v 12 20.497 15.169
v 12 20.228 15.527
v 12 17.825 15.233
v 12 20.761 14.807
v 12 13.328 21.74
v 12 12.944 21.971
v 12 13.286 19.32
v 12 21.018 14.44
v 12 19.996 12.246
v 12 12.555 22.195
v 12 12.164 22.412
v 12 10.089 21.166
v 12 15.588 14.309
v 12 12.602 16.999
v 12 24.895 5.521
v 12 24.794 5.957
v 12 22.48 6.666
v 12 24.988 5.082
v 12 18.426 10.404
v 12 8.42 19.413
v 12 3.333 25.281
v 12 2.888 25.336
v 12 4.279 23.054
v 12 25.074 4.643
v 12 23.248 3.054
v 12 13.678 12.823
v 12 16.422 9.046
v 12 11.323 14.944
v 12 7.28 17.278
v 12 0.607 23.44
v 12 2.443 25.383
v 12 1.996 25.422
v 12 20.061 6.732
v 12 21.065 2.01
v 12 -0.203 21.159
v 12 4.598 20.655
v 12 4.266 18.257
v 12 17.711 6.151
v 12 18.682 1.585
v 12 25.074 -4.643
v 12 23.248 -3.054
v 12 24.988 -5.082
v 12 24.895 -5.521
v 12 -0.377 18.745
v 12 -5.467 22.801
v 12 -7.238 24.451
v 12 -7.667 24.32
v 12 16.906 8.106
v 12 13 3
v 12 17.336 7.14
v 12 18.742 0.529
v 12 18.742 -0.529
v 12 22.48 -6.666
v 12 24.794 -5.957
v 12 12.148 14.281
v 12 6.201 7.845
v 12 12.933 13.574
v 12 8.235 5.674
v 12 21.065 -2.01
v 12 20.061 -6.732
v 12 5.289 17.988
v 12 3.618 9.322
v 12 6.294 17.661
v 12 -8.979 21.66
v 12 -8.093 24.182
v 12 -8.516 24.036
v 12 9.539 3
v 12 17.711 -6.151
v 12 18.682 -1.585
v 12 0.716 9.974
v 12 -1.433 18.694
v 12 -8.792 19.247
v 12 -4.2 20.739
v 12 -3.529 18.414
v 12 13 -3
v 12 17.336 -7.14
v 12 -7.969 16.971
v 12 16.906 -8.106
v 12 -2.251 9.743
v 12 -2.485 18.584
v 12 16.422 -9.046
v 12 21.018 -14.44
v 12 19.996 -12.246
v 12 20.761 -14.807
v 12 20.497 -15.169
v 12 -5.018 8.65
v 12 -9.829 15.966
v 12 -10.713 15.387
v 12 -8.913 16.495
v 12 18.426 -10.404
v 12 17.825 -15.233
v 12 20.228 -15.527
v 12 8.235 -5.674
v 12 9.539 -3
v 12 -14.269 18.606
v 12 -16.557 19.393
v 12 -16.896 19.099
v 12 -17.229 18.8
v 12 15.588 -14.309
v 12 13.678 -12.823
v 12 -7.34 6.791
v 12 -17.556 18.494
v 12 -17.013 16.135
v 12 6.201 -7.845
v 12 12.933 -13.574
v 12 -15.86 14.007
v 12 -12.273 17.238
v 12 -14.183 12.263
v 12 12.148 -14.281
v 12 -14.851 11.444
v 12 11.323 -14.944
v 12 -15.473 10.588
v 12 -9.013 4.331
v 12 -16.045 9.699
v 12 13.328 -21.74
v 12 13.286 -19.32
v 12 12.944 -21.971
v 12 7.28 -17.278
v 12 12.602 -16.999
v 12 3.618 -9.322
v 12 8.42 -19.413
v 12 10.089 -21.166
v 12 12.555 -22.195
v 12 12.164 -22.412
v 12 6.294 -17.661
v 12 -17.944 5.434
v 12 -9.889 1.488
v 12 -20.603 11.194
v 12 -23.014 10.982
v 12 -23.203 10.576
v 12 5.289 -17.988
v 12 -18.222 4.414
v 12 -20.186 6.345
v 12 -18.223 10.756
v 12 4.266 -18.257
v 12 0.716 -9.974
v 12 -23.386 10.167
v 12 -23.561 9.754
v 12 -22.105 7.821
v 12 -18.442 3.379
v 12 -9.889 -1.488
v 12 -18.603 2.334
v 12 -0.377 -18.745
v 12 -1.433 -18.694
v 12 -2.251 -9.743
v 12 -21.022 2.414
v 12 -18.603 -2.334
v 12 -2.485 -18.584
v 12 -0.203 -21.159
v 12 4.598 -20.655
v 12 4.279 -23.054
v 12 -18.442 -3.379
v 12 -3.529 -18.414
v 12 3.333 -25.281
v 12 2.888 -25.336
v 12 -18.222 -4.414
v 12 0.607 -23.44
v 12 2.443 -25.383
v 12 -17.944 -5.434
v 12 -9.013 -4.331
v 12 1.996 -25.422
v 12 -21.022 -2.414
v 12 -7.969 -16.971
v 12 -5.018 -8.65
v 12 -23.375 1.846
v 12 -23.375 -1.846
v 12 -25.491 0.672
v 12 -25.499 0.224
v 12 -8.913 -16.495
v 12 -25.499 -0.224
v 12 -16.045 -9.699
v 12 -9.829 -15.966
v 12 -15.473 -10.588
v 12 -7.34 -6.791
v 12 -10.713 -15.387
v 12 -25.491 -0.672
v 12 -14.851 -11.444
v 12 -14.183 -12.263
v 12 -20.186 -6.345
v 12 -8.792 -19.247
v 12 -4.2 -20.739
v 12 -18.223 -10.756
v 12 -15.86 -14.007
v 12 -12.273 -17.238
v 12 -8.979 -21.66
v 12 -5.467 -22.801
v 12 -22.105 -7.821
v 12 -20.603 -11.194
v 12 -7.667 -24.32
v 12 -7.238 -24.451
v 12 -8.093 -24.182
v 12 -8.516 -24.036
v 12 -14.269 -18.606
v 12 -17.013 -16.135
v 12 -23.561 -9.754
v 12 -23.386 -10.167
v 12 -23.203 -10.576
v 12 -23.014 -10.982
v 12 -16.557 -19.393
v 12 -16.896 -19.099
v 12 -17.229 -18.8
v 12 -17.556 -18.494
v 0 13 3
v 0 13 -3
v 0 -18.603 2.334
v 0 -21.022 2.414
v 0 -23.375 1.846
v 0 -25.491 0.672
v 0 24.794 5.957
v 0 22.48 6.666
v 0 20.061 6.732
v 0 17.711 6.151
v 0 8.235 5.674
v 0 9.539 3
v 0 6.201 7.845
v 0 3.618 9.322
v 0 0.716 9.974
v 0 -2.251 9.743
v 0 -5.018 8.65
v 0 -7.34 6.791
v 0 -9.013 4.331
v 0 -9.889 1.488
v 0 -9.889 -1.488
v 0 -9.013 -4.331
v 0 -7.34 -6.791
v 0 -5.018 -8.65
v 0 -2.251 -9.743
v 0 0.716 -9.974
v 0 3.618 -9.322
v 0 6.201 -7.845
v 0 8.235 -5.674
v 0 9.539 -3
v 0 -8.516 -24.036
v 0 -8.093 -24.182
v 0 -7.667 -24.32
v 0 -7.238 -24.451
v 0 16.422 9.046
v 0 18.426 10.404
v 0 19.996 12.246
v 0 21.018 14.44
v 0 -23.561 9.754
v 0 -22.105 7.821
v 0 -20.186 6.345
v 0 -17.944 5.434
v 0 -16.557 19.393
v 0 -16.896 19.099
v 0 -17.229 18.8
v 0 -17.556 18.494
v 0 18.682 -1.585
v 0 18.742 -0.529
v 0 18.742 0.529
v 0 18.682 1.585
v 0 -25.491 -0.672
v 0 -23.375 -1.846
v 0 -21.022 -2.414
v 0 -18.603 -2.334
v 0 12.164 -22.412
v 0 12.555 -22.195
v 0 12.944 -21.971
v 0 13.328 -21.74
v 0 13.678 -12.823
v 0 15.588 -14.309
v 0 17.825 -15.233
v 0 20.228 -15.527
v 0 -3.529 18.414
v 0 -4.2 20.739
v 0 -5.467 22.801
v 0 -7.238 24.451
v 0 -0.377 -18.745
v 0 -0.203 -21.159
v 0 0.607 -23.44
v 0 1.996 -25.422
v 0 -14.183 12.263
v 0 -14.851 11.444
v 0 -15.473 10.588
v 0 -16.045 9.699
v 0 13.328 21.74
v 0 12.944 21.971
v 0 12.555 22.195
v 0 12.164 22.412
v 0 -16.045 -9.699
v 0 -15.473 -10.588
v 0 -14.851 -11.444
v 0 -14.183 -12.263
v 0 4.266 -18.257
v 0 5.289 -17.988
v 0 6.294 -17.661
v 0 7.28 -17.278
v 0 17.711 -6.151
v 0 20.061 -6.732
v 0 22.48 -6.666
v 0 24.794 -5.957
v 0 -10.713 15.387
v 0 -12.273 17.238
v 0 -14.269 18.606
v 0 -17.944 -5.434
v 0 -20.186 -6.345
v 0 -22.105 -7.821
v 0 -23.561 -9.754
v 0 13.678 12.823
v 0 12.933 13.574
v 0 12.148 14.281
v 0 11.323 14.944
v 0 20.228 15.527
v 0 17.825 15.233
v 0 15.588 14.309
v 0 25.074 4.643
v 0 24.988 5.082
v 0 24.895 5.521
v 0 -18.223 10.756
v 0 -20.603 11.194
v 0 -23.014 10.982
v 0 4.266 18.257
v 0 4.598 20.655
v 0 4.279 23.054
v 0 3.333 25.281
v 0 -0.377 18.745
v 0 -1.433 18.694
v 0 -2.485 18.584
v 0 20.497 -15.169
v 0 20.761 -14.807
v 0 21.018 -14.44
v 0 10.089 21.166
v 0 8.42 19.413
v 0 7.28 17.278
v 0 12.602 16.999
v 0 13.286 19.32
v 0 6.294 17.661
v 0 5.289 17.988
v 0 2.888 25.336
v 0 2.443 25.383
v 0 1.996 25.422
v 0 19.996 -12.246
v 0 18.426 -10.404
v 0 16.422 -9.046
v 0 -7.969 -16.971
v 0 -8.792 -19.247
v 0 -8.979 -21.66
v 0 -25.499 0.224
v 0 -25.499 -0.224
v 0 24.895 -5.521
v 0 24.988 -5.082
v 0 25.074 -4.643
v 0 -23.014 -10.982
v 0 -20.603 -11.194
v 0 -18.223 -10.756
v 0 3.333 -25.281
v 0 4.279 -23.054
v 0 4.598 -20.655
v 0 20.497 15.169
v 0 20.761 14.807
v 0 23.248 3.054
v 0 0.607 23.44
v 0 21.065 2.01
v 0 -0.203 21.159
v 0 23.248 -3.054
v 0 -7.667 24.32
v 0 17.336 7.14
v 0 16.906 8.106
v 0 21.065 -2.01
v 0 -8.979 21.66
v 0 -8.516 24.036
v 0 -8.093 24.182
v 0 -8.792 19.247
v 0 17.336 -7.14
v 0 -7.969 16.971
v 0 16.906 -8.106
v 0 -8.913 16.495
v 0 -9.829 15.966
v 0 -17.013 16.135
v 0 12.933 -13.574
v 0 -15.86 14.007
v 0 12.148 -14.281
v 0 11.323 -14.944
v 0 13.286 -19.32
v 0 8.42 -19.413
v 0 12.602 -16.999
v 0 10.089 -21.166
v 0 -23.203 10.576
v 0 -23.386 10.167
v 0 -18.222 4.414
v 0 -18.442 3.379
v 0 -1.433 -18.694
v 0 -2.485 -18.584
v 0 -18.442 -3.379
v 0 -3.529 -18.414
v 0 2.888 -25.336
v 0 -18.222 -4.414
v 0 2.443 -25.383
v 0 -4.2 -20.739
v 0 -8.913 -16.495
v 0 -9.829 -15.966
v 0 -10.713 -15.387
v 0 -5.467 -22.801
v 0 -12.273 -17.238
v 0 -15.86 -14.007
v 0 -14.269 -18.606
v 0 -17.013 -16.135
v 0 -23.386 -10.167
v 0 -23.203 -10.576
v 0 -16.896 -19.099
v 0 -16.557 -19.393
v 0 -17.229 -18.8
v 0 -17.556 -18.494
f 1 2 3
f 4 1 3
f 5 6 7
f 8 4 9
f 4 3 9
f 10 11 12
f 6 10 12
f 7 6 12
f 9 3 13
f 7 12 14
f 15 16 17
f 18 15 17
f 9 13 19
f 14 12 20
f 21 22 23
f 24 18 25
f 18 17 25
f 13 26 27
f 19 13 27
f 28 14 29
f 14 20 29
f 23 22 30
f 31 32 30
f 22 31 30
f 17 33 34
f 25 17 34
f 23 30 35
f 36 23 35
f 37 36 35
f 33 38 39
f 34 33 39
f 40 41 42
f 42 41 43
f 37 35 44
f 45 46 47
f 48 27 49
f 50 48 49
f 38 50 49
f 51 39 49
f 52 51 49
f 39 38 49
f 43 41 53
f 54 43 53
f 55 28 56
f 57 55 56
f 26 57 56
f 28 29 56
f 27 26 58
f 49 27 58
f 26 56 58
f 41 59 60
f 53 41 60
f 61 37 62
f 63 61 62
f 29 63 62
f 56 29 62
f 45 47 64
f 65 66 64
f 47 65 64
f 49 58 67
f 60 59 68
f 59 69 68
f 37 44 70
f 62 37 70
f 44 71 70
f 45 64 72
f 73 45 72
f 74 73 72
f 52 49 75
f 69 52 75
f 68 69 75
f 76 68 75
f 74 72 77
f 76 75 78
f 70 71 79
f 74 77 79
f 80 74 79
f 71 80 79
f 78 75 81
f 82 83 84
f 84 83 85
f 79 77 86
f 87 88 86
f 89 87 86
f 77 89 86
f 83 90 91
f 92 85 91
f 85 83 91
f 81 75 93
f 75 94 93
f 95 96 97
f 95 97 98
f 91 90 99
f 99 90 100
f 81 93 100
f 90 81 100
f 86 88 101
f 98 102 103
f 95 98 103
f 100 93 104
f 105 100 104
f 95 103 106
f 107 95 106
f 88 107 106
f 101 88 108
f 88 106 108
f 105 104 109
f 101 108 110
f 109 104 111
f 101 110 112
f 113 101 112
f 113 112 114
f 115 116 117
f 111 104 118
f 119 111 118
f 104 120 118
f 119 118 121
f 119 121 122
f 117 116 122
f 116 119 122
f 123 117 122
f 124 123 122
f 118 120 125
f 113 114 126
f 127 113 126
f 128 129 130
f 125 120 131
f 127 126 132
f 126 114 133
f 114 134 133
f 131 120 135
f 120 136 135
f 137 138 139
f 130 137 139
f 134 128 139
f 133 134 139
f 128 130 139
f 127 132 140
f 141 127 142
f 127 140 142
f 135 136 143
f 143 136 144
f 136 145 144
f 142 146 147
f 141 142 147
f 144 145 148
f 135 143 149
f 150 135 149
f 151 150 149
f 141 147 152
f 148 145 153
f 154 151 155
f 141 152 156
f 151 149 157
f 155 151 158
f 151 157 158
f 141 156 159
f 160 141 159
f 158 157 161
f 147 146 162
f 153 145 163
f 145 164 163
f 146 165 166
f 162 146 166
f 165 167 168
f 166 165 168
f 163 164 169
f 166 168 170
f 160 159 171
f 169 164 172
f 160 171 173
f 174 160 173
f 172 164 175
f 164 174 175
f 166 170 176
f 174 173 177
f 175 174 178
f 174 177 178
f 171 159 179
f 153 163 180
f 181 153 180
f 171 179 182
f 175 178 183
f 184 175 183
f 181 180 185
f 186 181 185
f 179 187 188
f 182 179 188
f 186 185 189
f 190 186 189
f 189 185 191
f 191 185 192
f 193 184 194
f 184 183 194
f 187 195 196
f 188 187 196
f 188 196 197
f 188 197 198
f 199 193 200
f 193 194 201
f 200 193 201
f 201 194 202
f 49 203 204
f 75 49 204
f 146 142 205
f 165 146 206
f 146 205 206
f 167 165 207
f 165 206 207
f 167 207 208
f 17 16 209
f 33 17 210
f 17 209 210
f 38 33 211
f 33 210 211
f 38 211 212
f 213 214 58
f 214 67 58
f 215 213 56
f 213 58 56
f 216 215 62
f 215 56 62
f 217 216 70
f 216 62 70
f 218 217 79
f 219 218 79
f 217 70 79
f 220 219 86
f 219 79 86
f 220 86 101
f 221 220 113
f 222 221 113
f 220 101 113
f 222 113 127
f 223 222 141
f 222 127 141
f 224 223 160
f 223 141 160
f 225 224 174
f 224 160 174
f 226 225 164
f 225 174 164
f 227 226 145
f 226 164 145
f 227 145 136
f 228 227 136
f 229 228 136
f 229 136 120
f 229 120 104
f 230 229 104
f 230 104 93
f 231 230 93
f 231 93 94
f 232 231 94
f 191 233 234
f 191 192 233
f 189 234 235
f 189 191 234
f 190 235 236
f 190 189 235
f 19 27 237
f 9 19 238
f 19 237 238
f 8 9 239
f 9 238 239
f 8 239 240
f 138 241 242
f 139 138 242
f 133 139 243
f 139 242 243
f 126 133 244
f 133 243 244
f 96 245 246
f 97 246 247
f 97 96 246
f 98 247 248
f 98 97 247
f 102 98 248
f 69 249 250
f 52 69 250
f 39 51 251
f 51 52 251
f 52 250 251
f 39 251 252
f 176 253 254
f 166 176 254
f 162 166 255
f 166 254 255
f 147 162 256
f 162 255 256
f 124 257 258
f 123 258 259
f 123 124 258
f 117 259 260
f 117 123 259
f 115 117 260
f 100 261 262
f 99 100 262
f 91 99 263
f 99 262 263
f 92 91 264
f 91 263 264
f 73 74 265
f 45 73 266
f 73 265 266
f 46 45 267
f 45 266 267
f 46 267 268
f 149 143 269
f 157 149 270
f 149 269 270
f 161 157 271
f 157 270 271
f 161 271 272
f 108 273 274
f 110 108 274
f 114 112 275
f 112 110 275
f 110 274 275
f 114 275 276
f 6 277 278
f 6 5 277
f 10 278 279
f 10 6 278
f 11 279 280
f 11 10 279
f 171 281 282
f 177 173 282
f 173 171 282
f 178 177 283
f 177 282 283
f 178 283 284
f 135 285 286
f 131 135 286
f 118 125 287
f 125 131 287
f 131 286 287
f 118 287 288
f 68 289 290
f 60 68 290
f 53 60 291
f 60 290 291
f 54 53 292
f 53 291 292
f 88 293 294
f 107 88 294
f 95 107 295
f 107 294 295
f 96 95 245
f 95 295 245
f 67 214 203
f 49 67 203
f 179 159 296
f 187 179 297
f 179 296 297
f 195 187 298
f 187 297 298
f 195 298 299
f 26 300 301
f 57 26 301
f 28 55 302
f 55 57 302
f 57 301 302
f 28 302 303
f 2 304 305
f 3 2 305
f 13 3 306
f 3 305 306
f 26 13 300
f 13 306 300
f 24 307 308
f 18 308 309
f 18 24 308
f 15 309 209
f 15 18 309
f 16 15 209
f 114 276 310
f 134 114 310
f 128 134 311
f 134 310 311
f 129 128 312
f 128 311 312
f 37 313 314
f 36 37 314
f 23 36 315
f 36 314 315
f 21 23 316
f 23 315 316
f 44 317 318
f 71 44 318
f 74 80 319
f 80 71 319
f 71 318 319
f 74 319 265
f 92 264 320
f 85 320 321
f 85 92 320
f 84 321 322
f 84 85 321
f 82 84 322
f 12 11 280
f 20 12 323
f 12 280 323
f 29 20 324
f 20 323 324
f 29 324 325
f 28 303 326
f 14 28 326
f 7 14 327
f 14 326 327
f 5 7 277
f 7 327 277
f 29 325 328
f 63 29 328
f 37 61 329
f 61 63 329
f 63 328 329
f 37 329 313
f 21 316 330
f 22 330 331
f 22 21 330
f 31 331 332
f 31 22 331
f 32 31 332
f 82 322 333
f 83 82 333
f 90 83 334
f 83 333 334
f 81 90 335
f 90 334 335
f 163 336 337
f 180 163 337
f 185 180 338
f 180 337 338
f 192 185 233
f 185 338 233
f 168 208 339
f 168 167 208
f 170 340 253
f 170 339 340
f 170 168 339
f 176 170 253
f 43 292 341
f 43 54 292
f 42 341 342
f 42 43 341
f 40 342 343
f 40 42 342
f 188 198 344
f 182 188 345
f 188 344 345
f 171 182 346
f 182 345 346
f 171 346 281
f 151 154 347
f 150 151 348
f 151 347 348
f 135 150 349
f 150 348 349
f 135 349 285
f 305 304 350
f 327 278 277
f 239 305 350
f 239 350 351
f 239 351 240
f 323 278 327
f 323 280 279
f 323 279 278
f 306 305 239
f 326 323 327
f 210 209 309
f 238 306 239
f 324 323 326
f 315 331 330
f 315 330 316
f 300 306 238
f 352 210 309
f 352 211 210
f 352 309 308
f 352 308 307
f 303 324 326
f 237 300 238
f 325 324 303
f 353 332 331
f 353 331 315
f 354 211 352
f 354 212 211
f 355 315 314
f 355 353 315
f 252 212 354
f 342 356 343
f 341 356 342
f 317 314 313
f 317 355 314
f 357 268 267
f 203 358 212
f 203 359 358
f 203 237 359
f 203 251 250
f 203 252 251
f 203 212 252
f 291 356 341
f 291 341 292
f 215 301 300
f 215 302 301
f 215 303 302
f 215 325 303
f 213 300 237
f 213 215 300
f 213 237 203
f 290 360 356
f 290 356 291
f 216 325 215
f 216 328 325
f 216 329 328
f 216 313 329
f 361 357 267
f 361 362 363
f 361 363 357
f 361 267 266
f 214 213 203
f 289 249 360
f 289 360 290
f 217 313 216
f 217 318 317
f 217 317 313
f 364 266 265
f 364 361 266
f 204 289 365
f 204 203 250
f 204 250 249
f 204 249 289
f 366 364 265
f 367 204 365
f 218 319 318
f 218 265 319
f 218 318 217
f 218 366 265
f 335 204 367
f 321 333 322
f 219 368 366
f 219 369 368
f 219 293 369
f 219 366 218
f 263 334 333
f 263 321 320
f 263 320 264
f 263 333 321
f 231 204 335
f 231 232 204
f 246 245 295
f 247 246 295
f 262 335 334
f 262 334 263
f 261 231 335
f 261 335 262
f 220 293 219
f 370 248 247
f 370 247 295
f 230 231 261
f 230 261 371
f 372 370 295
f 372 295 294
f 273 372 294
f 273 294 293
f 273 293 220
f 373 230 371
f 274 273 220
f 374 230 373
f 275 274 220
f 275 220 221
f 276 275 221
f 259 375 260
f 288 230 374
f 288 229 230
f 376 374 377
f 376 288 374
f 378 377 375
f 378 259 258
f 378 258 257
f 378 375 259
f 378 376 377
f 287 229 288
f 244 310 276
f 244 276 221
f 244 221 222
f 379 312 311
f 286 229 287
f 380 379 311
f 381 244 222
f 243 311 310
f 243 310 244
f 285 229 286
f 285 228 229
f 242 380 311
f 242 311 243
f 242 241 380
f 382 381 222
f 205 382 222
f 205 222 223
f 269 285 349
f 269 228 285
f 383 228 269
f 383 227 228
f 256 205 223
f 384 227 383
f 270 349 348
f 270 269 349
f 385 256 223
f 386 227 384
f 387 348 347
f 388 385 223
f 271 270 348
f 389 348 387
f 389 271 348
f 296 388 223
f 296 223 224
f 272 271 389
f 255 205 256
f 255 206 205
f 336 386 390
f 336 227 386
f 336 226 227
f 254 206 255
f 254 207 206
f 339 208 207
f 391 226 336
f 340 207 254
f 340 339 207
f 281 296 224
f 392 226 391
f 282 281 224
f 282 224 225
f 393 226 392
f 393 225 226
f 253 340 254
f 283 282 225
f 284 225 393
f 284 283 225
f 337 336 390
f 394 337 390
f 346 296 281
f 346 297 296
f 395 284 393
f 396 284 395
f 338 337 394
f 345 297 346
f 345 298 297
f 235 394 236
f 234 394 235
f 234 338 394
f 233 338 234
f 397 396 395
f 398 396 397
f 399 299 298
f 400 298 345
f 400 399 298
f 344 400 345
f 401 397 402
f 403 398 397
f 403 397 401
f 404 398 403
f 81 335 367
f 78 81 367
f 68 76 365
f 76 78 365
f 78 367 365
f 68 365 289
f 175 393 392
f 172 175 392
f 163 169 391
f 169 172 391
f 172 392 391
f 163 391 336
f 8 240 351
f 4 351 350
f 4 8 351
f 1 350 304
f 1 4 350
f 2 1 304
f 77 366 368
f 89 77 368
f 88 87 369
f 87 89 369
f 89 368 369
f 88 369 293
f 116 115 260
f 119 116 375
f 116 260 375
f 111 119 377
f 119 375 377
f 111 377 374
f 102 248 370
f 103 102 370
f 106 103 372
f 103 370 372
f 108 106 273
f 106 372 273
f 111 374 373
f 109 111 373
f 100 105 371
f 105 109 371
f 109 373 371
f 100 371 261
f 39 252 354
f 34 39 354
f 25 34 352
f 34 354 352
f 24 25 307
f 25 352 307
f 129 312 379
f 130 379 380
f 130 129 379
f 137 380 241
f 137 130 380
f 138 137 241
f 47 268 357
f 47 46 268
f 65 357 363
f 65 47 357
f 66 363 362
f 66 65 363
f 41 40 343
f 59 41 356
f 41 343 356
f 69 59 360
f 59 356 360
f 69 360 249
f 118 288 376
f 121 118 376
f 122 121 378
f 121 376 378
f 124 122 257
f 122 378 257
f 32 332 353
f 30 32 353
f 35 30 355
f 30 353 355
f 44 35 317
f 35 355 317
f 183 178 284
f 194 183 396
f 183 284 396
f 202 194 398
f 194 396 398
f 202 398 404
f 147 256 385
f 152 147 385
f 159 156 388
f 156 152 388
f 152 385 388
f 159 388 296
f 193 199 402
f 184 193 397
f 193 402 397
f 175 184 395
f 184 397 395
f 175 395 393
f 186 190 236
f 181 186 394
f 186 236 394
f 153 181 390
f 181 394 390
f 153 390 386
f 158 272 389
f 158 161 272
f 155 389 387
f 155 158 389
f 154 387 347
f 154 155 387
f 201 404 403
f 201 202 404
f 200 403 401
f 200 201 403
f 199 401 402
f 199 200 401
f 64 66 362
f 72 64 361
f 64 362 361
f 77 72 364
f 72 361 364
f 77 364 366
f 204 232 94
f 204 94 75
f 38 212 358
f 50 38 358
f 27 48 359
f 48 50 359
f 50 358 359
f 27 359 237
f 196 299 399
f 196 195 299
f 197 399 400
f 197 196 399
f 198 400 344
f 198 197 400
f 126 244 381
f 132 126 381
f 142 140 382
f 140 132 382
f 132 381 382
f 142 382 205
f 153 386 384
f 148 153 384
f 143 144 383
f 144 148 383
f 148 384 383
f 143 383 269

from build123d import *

# Parameters (mm, degrees)
BASPROSKE_W             = 12
BASPROSKE_H             = 25.5
TOOTHCUT_DEPTH          = 39.006578378
TEETHCUTS_COUNT         = 15
TEETHCUTS_ANGLE         = 336
BORSKE_R                = 10
BORE_DEPTH              = 50.0000508
CUT_EXTRUDE1_DEPTH      = 38.954121274
CUT_EXTRUDE1_DEPTH_BACK = 38.954121274
SKETCH1_W               = 6
SKETCH1_H               = 6


with BuildPart() as part:
    # BasProSke → Base-Revolve (revolve)
    with BuildSketch(Plane(origin=(0, 0, 0), x_dir=(1, 0, 0), z_dir=(0, 1, 0)), mode=Mode.PRIVATE) as base_revolve_sk:
        with Locations((6, 12.75)):
            Rectangle(BASPROSKE_W, BASPROSKE_H)
    revolve(base_revolve_sk.sketch.rotate(Axis((-10, 0, 0), (1, 0, 0)), 180), axis=Axis((-10, 0, 0), (1, 0, 0)))

    # TooCutSke → ToothCut (cut, through all)
    with BuildSketch(Plane(origin=(0, 0, 0), x_dir=(0, 0, -1), z_dir=(1, 0, 0))):
        with BuildLine():
            ThreePointArc((1.584594428, 18.681918036), (0, 18.749), (-1.584594428, 18.681918036))
            ThreePointArc((-1.584594428, 18.681918036), (-2.465052499, 22.206073835), (-4.666912141, 25.095138498))
            ThreePointArc((-4.666912141, 25.095138498), (0, 25.5254), (4.666912141, 25.095138498))
            ThreePointArc((4.666912141, 25.095138498), (2.465052499, 22.206073835), (1.584594428, 18.681918036))
        make_face()
    toothcut = extrude(amount=TOOTHCUT_DEPTH, mode=Mode.SUBTRACT)

    # TeethCuts: ToothCut ×15 about axis
    teethcuts_axis = Axis((-10, 0, 0), (1, 0, 0))
    for i in range(1, TEETHCUTS_COUNT):
        add(toothcut.rotate(teethcuts_axis, i * TEETHCUTS_ANGLE / (TEETHCUTS_COUNT - 1)), mode=Mode.SUBTRACT)

    # BorSke → Bore (cut, symmetric)
    with BuildSketch(Plane(origin=(0, 0, 0), x_dir=(0, 0, -1), z_dir=(1, 0, 0))):
        with Locations(Location((0, 0, 0), (0, 0, 180))):
            Circle(BORSKE_R)
    extrude(amount=BORE_DEPTH, both=True, mode=Mode.SUBTRACT)

    # Sketch1 → Cut-Extrude1 (cut, two sides: drawn at the far end of the back side and taken through both)
    with BuildSketch(Plane(origin=(0, 0, 0), x_dir=(0, 0, -1), z_dir=(1, 0, 0)).offset(-CUT_EXTRUDE1_DEPTH_BACK)):
        with Locations((0, 10)):
            Rectangle(SKETCH1_W, SKETCH1_H)
    extrude(amount=CUT_EXTRUDE1_DEPTH + CUT_EXTRUDE1_DEPTH_BACK, mode=Mode.SUBTRACT)


solid = part.part
